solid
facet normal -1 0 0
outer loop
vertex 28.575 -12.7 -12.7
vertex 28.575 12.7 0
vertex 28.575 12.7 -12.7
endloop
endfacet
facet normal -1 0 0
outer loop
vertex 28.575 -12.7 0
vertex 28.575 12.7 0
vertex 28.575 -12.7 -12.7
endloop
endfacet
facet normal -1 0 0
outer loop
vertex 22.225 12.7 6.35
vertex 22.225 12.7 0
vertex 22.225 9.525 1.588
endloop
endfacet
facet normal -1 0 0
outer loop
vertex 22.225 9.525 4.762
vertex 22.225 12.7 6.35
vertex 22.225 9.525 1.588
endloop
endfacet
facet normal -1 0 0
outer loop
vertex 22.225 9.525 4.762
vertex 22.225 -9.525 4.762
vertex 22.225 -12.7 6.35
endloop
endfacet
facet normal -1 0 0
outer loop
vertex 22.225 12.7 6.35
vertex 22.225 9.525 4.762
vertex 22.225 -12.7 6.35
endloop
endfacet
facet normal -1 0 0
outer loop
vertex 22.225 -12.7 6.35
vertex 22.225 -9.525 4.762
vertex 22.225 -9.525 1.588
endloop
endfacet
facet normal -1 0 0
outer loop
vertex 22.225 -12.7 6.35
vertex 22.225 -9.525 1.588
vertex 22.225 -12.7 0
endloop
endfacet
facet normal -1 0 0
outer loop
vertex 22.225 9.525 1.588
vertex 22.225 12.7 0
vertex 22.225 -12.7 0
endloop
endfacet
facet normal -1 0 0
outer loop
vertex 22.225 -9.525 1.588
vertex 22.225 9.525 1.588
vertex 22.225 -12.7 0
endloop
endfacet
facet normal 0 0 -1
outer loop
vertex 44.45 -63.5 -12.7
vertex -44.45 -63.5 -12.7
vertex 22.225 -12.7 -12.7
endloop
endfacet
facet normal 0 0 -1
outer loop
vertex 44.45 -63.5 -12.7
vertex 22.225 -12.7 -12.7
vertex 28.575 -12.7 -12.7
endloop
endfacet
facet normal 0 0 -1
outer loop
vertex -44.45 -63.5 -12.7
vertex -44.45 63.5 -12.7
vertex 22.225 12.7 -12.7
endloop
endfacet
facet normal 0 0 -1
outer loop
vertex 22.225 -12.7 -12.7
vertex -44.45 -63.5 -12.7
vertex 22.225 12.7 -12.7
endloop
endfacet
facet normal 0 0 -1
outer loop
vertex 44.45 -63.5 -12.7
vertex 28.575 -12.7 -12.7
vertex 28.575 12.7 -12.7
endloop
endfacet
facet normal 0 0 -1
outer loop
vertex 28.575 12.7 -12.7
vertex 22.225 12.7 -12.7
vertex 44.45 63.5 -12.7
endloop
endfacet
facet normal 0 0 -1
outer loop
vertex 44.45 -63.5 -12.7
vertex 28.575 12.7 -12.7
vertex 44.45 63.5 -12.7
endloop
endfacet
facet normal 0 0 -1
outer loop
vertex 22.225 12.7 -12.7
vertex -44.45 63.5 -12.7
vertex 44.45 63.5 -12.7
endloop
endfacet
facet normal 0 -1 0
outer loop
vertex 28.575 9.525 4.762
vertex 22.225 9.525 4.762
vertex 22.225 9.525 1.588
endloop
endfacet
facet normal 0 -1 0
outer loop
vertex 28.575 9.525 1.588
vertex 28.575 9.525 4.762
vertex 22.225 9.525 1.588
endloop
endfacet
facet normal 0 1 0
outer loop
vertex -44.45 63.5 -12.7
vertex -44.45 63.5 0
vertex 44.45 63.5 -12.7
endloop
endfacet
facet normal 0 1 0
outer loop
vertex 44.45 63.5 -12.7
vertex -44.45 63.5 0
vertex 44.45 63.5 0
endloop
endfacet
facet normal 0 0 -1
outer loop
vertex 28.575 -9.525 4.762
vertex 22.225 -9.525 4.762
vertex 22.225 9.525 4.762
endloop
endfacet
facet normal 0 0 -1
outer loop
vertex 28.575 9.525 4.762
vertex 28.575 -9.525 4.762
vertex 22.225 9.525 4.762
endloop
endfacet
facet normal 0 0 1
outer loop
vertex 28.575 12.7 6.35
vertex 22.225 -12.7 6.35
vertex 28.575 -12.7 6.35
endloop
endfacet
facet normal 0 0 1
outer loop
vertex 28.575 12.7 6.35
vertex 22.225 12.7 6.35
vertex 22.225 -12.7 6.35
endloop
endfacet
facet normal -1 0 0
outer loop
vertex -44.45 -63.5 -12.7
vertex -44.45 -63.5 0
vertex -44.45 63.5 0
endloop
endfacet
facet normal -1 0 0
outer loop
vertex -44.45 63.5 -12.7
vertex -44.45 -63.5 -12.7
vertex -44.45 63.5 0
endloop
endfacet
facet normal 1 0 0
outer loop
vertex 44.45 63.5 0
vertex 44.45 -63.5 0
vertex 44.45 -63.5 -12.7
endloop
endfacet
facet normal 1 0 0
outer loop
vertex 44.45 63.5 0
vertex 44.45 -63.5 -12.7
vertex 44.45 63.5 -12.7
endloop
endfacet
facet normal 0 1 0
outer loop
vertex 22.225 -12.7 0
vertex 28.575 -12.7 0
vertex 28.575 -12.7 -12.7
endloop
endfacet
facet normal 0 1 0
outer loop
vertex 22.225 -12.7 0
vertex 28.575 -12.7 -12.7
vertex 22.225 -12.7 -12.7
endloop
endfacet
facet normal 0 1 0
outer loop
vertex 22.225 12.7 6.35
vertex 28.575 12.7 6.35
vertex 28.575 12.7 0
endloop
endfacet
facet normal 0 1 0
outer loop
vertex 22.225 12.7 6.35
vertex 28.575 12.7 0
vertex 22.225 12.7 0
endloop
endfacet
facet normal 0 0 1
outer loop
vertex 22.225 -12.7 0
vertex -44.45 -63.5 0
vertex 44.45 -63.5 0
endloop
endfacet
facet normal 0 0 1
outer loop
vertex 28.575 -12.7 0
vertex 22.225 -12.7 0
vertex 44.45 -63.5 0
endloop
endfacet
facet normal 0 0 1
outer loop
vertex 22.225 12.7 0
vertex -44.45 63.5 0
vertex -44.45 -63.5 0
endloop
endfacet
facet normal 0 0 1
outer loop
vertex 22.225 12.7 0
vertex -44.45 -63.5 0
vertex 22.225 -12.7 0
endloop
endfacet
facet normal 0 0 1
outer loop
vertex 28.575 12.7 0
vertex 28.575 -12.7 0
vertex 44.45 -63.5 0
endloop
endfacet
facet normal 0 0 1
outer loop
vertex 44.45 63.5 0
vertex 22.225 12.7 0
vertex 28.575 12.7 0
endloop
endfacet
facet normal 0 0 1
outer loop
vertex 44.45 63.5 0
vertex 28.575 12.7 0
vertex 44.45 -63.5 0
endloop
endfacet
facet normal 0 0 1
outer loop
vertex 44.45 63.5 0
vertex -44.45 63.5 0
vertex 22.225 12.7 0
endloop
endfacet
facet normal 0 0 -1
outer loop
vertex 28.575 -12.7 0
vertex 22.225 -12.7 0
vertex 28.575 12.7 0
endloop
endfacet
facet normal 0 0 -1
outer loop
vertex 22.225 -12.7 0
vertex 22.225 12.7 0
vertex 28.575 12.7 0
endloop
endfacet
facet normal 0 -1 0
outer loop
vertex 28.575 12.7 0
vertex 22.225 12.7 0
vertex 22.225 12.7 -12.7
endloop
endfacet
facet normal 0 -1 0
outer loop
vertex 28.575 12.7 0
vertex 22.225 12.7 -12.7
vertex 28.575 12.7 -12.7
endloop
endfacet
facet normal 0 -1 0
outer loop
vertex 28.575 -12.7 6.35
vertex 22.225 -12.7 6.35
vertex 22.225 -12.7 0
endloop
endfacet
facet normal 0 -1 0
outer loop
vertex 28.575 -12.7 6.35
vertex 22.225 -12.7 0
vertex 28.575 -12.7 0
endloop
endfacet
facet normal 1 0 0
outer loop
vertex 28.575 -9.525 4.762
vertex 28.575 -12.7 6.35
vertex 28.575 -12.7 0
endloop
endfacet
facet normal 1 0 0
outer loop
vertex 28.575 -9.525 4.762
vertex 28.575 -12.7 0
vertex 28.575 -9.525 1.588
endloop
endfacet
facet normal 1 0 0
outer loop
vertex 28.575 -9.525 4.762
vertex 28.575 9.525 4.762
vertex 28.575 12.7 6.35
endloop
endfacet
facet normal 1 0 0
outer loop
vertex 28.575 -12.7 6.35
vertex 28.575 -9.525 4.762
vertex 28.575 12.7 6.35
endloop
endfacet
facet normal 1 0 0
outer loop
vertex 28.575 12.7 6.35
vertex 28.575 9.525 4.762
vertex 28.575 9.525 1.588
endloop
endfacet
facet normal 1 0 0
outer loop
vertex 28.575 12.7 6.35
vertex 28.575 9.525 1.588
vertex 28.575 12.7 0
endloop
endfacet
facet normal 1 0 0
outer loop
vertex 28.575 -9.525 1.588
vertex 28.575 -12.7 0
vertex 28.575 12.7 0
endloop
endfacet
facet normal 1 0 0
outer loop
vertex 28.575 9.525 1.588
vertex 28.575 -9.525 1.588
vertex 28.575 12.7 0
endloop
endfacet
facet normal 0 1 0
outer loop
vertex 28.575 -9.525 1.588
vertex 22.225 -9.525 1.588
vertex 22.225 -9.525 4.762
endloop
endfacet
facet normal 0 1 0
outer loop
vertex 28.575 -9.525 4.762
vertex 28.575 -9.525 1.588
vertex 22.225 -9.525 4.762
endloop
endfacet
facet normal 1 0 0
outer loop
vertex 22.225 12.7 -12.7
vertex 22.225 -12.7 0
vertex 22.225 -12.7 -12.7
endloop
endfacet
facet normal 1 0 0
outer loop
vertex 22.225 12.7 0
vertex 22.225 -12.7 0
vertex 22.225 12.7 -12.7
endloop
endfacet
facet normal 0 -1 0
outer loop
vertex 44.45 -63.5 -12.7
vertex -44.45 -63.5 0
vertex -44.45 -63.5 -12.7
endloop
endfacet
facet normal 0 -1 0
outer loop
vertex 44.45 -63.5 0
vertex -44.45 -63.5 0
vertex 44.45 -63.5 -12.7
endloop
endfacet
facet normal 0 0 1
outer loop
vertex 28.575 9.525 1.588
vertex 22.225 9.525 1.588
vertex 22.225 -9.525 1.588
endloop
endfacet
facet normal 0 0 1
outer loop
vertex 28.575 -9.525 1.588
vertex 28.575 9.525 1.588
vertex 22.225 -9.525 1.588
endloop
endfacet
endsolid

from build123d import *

# Parameters (mm, degrees)
F0_W     = 88.9
F0_H     = 127
F1_DEPTH = 12.7
F2_DEPTH = 6.35
F4_DEPTH = 25.4


with BuildPart() as f1:
    # F0 (on Top) → F1 (new body)
    with BuildSketch(Plane.XY):
        Rectangle(F0_W, F0_H)
        Polygon((28.575, 12.7), (28.575, -12.7), (22.225, -12.7), (22.225, 0), (22.225, 12.7), align=None, mode=Mode.SUBTRACT)
    extrude(amount=-F1_DEPTH)


with BuildPart() as f2:
    # F0 (on Top) → F2 (new body)
    with BuildSketch(Plane.XY):
        Polygon((22.225, -12.7), (28.575, -12.7), (28.575, 12.7), (22.225, 12.7), (22.225, 0), align=None)
    extrude(amount=F2_DEPTH)

    # F3 (on face) → F4 (cut)
    with BuildSketch(Plane(origin=(22.225, 0, 0), x_dir=(0, -1, 0), z_dir=(-1, 0, 0))):
        Polygon((9.525, 1.5875), (9.525, 4.7625), (-9.525, 4.7625), (-9.525, 1.5875), (0, 1.5875), align=None)
    extrude(amount=-F4_DEPTH, mode=Mode.SUBTRACT)


solid = Compound([f1.part, f2.part])
